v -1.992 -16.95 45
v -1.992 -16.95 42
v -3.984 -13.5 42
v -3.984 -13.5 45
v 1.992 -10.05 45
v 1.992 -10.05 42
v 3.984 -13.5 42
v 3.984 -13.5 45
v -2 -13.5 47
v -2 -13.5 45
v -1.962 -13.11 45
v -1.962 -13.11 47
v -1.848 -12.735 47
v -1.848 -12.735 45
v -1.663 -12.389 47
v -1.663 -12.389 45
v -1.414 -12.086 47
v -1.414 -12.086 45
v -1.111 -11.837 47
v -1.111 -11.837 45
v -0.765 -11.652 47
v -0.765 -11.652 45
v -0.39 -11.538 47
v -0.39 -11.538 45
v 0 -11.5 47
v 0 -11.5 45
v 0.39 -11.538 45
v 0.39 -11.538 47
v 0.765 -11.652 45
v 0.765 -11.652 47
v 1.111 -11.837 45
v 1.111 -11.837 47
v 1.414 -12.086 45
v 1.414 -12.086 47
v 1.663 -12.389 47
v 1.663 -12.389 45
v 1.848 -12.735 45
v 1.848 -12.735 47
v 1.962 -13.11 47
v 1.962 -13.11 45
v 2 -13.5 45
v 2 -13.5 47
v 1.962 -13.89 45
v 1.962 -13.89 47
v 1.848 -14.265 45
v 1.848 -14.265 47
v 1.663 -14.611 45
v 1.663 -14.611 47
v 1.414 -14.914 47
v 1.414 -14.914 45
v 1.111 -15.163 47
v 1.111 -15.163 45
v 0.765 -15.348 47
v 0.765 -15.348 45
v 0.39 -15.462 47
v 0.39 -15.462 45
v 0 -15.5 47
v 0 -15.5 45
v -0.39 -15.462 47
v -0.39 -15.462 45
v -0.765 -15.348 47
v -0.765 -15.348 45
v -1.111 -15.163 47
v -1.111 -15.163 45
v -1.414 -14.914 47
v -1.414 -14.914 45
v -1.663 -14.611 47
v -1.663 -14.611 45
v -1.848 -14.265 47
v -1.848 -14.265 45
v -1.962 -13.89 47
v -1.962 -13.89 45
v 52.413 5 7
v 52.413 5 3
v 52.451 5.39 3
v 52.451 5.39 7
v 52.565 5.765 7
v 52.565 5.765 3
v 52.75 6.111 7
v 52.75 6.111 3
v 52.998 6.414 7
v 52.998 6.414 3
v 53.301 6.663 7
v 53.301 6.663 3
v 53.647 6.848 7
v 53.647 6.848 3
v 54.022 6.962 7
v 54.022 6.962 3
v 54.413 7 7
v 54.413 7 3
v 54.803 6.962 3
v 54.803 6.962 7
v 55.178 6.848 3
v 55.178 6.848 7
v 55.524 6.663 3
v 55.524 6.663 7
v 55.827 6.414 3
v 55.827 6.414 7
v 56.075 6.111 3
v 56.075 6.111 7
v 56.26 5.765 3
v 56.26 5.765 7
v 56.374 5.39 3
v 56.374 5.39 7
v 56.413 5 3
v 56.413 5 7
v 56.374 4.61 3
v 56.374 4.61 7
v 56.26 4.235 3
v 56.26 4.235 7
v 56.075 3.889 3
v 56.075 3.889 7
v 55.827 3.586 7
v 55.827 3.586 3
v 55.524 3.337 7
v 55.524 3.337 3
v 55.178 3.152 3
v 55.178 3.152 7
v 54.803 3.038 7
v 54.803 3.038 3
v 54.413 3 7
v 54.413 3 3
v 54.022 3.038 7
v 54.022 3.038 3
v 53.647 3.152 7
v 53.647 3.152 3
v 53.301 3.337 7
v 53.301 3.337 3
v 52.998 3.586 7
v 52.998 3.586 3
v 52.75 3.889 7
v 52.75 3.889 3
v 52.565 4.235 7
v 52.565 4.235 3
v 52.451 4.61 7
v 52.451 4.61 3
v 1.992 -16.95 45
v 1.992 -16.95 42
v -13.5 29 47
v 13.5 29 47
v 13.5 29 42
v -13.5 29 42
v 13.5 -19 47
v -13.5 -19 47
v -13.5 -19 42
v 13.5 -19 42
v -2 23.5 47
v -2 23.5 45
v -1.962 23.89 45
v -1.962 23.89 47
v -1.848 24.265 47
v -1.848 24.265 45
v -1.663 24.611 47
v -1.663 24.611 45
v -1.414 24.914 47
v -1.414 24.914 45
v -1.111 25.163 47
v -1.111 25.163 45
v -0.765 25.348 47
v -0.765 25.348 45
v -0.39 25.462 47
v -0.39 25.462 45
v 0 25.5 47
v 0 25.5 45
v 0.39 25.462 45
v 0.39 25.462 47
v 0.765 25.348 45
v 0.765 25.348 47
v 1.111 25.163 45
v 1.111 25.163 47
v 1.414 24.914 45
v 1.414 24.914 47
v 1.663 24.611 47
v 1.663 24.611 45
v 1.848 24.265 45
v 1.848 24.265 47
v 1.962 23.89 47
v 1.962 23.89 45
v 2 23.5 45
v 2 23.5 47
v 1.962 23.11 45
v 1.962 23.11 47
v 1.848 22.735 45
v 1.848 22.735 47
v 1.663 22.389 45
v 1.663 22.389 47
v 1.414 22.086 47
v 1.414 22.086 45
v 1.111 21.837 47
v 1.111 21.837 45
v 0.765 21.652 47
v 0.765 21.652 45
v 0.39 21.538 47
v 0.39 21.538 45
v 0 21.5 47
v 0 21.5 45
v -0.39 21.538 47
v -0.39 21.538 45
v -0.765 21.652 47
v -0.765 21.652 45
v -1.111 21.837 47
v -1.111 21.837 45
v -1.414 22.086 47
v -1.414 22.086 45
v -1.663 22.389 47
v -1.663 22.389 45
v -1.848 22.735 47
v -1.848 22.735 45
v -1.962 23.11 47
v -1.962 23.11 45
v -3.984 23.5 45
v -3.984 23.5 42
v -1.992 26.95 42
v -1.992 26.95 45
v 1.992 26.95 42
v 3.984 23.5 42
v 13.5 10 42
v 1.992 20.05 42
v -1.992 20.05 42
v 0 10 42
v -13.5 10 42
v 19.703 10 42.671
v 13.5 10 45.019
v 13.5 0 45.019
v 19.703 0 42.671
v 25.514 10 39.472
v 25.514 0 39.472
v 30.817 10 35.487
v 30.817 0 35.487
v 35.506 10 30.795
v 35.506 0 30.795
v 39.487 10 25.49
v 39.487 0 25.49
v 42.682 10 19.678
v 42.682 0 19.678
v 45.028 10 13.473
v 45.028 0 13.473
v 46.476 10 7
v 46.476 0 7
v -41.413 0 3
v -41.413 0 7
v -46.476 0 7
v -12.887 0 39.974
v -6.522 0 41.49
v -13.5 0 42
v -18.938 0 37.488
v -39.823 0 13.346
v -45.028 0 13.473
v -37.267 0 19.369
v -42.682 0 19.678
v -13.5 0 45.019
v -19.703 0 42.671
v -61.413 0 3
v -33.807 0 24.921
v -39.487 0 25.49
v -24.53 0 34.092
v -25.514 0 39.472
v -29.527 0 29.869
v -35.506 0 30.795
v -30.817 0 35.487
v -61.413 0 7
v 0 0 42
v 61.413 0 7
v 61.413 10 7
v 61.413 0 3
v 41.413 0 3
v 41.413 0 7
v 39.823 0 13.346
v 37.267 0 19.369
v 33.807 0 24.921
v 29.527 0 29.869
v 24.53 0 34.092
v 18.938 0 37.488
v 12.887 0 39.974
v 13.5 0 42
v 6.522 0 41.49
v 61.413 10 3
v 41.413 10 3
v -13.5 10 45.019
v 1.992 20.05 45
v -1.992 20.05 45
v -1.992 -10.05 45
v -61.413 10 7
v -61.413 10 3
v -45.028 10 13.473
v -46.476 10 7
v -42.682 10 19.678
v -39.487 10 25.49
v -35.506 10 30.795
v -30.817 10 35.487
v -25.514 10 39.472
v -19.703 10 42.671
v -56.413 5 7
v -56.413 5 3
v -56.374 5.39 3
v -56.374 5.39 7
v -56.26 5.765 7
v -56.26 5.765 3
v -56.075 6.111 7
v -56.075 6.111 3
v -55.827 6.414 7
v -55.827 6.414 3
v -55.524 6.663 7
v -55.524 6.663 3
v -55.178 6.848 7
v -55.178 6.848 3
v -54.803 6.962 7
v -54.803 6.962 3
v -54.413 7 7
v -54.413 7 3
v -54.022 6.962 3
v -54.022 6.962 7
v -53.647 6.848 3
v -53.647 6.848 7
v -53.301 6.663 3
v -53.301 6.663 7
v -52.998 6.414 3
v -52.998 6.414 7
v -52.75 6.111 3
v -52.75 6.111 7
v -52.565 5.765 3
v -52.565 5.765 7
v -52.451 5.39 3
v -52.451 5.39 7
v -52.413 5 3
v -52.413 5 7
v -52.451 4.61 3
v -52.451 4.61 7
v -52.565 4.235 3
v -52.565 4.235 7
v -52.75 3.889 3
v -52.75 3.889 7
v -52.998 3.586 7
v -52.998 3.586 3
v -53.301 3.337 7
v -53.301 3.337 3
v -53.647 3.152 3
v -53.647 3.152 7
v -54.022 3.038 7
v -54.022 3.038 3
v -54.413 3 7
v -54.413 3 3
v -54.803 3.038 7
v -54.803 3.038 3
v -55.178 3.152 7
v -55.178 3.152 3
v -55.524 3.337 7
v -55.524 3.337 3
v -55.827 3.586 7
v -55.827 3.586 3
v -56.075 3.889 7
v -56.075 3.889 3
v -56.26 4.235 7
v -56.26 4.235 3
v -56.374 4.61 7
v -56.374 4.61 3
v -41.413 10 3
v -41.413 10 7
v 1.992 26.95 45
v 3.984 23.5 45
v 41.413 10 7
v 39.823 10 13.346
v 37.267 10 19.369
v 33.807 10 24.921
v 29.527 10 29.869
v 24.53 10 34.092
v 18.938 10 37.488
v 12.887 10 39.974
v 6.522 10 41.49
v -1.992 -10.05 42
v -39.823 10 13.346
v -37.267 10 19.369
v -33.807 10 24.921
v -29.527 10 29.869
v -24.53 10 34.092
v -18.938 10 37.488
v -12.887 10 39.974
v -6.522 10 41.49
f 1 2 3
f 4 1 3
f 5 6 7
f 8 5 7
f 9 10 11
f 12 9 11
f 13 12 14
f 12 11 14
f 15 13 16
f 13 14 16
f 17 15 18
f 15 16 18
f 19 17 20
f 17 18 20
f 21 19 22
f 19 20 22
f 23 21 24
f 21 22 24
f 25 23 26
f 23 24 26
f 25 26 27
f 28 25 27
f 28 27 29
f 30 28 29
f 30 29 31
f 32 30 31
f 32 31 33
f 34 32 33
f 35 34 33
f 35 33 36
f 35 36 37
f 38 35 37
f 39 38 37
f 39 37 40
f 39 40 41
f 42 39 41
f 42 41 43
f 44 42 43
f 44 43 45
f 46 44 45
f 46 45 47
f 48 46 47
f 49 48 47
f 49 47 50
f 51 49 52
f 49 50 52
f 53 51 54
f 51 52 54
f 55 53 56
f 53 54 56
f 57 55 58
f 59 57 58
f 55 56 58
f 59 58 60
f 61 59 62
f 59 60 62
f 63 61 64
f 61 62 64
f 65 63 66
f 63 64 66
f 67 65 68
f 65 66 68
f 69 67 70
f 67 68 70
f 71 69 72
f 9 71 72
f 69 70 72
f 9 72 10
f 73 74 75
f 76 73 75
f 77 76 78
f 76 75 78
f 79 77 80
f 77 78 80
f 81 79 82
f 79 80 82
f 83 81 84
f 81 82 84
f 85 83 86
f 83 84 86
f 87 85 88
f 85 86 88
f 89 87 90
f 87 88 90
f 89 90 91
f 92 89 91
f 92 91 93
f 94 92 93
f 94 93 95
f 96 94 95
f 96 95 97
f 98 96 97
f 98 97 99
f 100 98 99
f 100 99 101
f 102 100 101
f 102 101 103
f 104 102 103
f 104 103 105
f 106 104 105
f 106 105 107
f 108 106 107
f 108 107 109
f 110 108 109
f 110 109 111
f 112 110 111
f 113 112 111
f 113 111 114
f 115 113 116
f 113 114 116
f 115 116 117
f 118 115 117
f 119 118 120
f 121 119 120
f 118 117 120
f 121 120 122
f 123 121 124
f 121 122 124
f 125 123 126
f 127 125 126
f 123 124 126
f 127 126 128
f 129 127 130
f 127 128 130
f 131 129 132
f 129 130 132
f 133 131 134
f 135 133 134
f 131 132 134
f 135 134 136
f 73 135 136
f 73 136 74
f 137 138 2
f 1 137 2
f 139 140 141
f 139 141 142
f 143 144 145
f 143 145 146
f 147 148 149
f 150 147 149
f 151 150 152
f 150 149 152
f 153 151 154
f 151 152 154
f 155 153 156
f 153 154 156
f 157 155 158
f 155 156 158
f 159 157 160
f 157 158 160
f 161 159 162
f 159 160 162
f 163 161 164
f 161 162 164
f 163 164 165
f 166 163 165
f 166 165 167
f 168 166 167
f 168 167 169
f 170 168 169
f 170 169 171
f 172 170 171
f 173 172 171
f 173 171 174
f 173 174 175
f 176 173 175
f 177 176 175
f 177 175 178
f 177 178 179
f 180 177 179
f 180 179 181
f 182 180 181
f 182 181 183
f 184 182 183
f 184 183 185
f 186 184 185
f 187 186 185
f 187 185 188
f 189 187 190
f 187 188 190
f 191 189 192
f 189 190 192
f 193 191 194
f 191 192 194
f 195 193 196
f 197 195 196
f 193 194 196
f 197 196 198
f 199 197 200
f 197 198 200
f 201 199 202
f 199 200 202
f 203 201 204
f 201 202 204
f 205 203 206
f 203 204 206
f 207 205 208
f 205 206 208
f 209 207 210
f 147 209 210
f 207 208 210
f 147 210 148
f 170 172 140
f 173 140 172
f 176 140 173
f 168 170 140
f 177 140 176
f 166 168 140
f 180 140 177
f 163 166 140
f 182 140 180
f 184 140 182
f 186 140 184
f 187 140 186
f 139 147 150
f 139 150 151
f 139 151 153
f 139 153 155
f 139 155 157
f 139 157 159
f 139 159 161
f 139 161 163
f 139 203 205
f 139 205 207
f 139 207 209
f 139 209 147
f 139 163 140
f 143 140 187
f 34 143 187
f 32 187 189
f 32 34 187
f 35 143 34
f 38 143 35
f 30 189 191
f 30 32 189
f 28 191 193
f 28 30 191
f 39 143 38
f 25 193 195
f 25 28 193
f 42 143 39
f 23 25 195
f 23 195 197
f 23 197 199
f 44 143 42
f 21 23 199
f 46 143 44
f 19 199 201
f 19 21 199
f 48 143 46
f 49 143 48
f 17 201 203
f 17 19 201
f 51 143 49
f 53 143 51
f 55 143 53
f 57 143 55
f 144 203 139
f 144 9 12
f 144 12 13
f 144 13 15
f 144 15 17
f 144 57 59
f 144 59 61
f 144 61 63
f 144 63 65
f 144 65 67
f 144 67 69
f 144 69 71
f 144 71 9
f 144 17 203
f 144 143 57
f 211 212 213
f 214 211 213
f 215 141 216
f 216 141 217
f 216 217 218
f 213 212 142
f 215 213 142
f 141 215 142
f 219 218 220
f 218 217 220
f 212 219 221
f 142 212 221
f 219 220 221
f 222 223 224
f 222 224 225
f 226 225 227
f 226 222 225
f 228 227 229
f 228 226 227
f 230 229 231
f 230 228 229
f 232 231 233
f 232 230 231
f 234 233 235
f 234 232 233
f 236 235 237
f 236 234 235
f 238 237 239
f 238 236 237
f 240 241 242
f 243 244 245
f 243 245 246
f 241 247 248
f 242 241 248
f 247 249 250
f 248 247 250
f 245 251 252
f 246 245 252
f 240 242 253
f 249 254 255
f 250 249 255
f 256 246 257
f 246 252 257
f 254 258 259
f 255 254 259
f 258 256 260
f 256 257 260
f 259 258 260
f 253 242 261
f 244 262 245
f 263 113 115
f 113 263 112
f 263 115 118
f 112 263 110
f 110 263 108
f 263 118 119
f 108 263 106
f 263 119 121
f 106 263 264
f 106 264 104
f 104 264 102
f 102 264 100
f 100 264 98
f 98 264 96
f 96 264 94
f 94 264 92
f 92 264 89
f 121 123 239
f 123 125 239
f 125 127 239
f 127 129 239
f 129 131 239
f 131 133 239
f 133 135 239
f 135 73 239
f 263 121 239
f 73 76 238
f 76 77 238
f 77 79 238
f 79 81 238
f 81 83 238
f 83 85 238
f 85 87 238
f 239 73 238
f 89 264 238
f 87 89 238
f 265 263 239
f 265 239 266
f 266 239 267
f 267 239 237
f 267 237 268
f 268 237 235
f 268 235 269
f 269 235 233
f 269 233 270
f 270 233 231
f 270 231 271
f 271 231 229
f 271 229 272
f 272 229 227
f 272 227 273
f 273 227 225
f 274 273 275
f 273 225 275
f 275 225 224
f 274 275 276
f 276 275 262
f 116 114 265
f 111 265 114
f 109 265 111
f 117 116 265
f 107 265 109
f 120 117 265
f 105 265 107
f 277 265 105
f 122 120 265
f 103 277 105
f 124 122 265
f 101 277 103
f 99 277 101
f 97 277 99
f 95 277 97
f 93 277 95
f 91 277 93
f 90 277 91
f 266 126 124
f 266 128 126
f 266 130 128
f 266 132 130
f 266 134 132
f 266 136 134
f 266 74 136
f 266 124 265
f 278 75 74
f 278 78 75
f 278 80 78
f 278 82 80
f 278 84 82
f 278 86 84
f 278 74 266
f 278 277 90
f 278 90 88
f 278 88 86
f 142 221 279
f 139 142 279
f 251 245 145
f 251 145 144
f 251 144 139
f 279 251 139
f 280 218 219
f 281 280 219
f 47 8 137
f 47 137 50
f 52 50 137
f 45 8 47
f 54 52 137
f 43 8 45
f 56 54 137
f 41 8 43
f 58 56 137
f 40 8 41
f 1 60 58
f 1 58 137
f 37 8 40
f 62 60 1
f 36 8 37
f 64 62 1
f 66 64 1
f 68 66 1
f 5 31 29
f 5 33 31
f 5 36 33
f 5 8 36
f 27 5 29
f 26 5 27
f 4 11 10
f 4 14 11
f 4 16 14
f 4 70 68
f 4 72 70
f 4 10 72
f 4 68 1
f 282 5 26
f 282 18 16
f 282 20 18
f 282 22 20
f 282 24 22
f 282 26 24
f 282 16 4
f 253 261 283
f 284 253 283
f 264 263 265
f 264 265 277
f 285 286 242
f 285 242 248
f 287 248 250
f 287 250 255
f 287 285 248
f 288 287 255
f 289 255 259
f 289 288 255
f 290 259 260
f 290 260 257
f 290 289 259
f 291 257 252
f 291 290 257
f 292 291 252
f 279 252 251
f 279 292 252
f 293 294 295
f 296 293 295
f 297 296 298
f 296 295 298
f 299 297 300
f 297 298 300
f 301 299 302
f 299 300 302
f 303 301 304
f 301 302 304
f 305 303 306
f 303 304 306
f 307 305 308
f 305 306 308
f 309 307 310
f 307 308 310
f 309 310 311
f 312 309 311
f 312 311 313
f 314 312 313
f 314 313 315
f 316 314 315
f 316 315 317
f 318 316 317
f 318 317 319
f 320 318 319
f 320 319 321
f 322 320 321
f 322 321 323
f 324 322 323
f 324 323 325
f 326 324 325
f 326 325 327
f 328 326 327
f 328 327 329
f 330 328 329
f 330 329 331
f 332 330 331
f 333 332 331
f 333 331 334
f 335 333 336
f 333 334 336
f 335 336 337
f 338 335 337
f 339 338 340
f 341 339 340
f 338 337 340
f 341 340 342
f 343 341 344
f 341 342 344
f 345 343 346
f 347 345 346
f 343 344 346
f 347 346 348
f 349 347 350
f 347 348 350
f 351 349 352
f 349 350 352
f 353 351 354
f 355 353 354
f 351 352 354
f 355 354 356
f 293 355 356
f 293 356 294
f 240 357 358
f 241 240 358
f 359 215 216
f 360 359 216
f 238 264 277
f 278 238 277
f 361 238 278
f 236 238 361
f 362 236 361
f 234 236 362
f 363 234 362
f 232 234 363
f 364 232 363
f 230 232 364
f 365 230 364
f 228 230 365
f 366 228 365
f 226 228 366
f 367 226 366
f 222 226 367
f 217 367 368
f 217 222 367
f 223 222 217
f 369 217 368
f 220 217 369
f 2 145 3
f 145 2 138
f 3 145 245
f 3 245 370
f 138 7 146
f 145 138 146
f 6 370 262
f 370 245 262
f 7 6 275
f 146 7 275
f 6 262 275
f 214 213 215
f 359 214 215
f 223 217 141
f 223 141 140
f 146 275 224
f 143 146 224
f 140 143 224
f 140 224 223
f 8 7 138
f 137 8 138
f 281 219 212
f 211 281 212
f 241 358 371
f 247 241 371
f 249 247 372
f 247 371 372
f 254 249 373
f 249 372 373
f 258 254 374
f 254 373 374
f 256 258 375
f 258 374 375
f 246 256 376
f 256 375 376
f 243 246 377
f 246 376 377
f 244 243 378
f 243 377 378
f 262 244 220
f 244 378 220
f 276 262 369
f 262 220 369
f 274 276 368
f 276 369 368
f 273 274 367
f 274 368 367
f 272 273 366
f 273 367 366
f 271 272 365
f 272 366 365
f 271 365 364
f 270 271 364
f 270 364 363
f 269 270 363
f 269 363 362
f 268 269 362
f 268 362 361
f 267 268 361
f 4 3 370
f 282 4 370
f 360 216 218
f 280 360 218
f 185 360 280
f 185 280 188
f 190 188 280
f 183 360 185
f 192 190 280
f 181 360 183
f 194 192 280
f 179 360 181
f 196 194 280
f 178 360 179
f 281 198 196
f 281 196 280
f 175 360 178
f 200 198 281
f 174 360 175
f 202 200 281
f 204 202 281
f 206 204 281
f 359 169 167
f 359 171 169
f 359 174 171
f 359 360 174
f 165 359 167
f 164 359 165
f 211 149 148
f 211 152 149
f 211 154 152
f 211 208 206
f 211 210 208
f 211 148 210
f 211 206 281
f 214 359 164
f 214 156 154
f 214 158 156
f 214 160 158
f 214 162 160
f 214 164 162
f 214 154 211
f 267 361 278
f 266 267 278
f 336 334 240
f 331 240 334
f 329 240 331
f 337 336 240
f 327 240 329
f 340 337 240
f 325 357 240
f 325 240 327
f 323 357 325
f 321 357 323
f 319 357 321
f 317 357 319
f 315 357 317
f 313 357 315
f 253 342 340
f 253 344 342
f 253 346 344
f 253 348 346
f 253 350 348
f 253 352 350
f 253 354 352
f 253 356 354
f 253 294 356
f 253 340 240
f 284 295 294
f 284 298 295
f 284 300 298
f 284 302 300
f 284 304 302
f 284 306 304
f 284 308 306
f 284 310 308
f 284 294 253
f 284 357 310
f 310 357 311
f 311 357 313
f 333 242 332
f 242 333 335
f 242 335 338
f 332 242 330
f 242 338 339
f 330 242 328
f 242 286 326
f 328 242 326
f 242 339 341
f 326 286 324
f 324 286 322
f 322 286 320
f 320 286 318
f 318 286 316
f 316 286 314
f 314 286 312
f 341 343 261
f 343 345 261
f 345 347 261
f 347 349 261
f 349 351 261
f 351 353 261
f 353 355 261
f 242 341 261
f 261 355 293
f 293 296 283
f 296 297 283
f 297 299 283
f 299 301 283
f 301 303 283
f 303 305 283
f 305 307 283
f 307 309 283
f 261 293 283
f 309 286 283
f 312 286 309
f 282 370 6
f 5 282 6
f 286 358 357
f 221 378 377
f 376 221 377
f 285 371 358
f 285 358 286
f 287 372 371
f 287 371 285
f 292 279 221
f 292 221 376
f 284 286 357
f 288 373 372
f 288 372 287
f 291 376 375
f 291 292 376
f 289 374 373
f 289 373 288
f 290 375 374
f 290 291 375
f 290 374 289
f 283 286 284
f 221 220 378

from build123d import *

# Parameters (mm, degrees)
EXTRUDE_1_DEPTH           = 10
SKETCH_2_W                = 27
SKETCH_2_H                = 10
EXTRUDE_2_DEPTH           = 1.980559755
SKETCH_3_W                = 122.825116964
SKETCH_3_H                = 10
EXTRUDE_3_DEPTH           = 4
SKETCH_4_W                = 27
SKETCH_4_H                = 5
EXTRUDE_4_DEPTH           = 19
CUT_EXTRUDE_1_DEPTH       = 83.592386691
SKETCH_6_W                = 27
SKETCH_6_H                = 5
EXTRUDE_5_DEPTH           = 19
CUT_EXTRUDE_2_DEPTH       = 3
CUT_EXTRUDE_3_DEPTH       = 3
HOLE_WIZARD_4_0_4_1_D     = 4
HOLE_WIZARD_4_0_4_1_DEPTH = 44
HOLE_WIZARD_4_0_4_2_D     = 4


with BuildPart() as part:
    # Эскиз1 → Бобышка-Вытянуть1 (new body)
    with BuildSketch(Plane(origin=(0, 10, 0), x_dir=(1, 0, 0), z_dir=(0, 1, 0))):
        with BuildLine():
            Line((-13.5, -45.019440245), (13.5, -45.019440245))
            ThreePointArc((13.5, -45.019440245), (35.505543373, -30.795395594), (46.475800154, -7))
            Line((46.475800154, -7), (-46.475800154, -7))
            ThreePointArc((-46.475800154, -7), (-35.505543373, -30.795395594), (-13.5, -45.019440245))
        make_face()
    extrude(amount=-EXTRUDE_1_DEPTH)

    # Эскиз2 → Бобышка-Вытянуть2 (add)
    with BuildSketch(Plane.XY.offset(45.019440245)):
        with Locations((0, 5)):
            Rectangle(SKETCH_2_W, SKETCH_2_H)
    extrude(amount=EXTRUDE_2_DEPTH)

    # Эскиз3 → Бобышка-Вытянуть3 (add)
    with BuildSketch(Plane(origin=(0, 0, 7), x_dir=(-1, 0, 0), z_dir=(0, 0, -1))):
        with Locations((0, 5)):
            Rectangle(SKETCH_3_W, SKETCH_3_H)
    extrude(amount=EXTRUDE_3_DEPTH)

    # Эскиз4 → Бобышка-Вытянуть4 (add)
    with BuildSketch(Plane.XZ):
        with Locations((0, 44.5)):
            Rectangle(SKETCH_4_W, SKETCH_4_H)
    extrude(amount=EXTRUDE_4_DEPTH)

    # Эскиз5 → Вырез-Вытянуть1 (cut, through all)
    with BuildSketch(Plane(origin=(0, 10, 0), x_dir=(-1, 0, 0), z_dir=(0, 1, 0))):
        with BuildLine():
            Line((-41.412558482, 3), (41.412558482, 3))
            Line((41.412558482, 3), (41.412558482, 7))
            ThreePointArc((41.412558482, 7), (0, 42), (-41.412558482, 7))
            Line((-41.412558482, 7), (-41.412558482, 3))
        make_face()
    extrude(amount=-CUT_EXTRUDE_1_DEPTH, mode=Mode.SUBTRACT)

    # Эскиз6 → Бобышка-Вытянуть5 (add)
    with BuildSketch(Plane(origin=(0, 10, 0), x_dir=(-1, 0, 0), z_dir=(0, 1, 0))):
        with Locations((0, 44.5)):
            Rectangle(SKETCH_6_W, SKETCH_6_H)
    extrude(amount=EXTRUDE_5_DEPTH)

    # Эскиз7 → Вырез-Вытянуть2 (cut)
    with BuildSketch(Plane(origin=(0, 0, 42), x_dir=(-1, 0, 0), z_dir=(0, 0, -1))):
        Polygon((1.991858429, 26.95), (-1.991858429, 26.95), (-3.983716857, 23.5), (-1.991858429, 20.05), (1.991858429, 20.05), (3.983716857, 23.5), align=None)
    extrude(amount=-CUT_EXTRUDE_2_DEPTH, mode=Mode.SUBTRACT)

    # Эскиз8 → Вырез-Вытянуть3 (cut)
    with BuildSketch(Plane(origin=(0, 0, 42), x_dir=(-1, 0, 0), z_dir=(0, 0, -1))):
        Polygon((1.991858429, -10.05), (-1.991858429, -10.05), (-3.983716857, -13.5), (-1.991858429, -16.95), (1.991858429, -16.95), (3.983716857, -13.5), align=None)
    extrude(amount=-CUT_EXTRUDE_3_DEPTH, mode=Mode.SUBTRACT)

    # Диаметр отверстия Ø4.0 (4)1
    with Locations(Plane.XY.offset(47)):
        with Locations((0, 23.5), (0, -13.5)):
            Hole(HOLE_WIZARD_4_0_4_1_D / 2, depth=HOLE_WIZARD_4_0_4_1_DEPTH)

    # Диаметр отверстия Ø4.0 (4)2 (through all)
    with Locations(Plane.XY.offset(7)):
        with Locations((-54.412558482, 5), (54.412558482, 5)):
            Hole(HOLE_WIZARD_4_0_4_2_D / 2)


solid = part.part
